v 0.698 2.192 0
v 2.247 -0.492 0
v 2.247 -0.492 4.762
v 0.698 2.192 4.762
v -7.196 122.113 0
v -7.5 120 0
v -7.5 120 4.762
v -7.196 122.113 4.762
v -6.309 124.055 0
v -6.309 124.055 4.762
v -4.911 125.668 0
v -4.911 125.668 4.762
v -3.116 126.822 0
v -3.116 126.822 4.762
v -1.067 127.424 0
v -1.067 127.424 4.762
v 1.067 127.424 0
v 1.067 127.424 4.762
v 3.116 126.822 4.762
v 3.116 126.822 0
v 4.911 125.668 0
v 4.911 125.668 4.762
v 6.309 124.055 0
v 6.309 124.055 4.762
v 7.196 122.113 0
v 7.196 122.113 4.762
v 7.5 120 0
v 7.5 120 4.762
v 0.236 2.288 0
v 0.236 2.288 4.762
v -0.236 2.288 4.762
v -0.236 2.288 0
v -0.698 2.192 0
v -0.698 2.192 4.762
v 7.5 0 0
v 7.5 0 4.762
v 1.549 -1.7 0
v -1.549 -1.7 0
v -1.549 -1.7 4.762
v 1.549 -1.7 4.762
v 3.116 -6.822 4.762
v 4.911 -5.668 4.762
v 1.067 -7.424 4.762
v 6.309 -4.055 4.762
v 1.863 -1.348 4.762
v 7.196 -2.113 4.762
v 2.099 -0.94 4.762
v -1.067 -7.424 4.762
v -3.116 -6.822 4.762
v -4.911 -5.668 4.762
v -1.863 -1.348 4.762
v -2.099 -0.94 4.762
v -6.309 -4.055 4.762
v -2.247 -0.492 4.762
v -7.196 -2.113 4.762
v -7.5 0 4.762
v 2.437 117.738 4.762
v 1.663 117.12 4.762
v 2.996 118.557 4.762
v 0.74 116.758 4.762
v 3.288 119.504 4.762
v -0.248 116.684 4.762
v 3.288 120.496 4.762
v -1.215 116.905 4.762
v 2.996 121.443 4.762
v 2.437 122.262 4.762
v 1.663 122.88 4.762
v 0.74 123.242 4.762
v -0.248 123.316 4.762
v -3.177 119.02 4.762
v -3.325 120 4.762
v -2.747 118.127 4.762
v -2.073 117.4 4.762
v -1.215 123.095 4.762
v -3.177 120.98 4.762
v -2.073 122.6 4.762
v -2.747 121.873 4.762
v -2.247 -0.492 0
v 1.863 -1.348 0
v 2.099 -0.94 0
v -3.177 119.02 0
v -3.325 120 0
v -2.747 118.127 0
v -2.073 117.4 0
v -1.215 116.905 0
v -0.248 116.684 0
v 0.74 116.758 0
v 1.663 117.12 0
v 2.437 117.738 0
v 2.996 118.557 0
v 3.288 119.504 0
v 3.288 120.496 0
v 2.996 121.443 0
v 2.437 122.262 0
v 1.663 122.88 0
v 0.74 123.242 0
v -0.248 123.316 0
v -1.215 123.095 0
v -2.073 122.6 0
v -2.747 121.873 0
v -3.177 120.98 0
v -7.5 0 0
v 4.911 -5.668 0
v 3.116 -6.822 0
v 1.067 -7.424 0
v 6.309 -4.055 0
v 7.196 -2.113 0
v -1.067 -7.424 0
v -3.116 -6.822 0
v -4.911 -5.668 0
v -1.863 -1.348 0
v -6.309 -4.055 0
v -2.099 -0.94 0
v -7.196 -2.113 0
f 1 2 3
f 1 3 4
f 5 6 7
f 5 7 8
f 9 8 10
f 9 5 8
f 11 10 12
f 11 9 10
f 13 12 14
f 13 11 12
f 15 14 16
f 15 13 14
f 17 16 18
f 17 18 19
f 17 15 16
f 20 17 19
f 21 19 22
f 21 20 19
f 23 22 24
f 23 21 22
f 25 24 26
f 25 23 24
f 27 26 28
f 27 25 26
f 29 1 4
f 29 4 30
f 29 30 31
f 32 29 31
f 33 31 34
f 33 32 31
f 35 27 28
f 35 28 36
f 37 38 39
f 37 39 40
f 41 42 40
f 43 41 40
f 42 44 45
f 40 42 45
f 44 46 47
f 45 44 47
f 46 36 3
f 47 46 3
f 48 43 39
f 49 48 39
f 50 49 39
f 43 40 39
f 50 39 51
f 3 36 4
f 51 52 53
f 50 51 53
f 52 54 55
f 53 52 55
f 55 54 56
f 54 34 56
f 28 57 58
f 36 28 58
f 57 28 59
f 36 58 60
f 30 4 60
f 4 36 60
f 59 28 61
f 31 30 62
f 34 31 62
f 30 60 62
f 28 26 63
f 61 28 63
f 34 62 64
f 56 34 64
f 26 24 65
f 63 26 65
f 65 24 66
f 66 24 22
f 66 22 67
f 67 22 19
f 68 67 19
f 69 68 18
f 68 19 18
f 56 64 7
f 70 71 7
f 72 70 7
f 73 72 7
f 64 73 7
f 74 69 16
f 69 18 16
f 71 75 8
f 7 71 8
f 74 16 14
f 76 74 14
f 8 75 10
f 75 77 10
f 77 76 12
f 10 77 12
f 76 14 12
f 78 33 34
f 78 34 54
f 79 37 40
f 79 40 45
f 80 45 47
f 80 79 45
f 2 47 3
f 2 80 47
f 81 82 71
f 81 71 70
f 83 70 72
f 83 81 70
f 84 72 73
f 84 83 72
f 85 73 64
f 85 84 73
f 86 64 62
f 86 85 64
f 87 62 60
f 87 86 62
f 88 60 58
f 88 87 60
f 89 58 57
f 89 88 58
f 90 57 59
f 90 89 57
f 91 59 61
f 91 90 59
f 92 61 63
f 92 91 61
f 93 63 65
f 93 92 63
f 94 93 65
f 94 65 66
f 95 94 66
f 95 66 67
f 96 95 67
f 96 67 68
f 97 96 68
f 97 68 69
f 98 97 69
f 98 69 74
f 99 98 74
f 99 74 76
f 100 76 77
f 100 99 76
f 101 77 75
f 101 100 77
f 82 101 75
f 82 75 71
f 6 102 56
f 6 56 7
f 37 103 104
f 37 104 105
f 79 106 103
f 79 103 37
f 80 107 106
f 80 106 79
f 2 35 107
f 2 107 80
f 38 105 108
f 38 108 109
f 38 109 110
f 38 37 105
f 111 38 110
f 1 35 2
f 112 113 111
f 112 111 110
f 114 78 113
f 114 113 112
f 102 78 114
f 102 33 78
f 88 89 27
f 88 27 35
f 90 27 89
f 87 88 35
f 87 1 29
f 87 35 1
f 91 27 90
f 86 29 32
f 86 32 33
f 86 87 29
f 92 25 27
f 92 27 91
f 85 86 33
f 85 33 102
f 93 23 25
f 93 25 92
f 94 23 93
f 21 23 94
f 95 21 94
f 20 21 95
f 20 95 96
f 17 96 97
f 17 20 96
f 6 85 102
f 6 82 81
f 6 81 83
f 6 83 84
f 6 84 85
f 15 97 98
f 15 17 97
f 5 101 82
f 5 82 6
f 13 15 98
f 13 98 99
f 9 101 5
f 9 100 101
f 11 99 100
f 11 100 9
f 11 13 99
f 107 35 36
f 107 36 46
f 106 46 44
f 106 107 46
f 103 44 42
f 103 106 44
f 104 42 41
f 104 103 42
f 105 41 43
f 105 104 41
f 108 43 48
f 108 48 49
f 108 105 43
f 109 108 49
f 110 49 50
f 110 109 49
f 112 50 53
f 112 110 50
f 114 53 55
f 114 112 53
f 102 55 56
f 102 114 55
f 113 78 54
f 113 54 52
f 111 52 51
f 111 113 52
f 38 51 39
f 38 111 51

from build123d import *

# Parameters (mm, degrees)
ESBO_O1_R                = 3.325
RESSALTO_EXTRUS_O1_DEPTH = 4.7625


with BuildPart() as part:
    # Esboço1 → Ressalto-extrusão1 (new body)
    with BuildSketch(Plane.XY):
        with BuildLine():
            Line((-7.5, 0), (-7.5, 120))
            ThreePointArc((-7.5, 120), (0, 127.5), (7.5, 120))
            Line((7.5, 120), (7.5, 0))
            ThreePointArc((7.5, 0), (0, -7.5), (-7.5, 0))
        make_face()
        with Locations(Location((0, 120, 0), (0, 0, 180))):
            Circle(ESBO_O1_R, mode=Mode.SUBTRACT)
        with BuildLine():
            Line((2.246839856, -0.491640786), (0.697646517, 2.191640786))
            ThreePointArc((0.697646517, 2.191640786), (0, 2.3), (-0.697646517, 2.191640786))
            Line((-0.697646517, 2.191640786), (-2.246839856, -0.491640786))
            ThreePointArc((-2.246839856, -0.491640786), (-1.991858429, -1.15), (-1.549193338, -1.7))
            Line((-1.549193338, -1.7), (1.549193338, -1.7))
            ThreePointArc((1.549193338, -1.7), (1.991858429, -1.15), (2.246839856, -0.491640786))
        make_face(mode=Mode.SUBTRACT)
    extrude(amount=RESSALTO_EXTRUS_O1_DEPTH)


solid = part.part
